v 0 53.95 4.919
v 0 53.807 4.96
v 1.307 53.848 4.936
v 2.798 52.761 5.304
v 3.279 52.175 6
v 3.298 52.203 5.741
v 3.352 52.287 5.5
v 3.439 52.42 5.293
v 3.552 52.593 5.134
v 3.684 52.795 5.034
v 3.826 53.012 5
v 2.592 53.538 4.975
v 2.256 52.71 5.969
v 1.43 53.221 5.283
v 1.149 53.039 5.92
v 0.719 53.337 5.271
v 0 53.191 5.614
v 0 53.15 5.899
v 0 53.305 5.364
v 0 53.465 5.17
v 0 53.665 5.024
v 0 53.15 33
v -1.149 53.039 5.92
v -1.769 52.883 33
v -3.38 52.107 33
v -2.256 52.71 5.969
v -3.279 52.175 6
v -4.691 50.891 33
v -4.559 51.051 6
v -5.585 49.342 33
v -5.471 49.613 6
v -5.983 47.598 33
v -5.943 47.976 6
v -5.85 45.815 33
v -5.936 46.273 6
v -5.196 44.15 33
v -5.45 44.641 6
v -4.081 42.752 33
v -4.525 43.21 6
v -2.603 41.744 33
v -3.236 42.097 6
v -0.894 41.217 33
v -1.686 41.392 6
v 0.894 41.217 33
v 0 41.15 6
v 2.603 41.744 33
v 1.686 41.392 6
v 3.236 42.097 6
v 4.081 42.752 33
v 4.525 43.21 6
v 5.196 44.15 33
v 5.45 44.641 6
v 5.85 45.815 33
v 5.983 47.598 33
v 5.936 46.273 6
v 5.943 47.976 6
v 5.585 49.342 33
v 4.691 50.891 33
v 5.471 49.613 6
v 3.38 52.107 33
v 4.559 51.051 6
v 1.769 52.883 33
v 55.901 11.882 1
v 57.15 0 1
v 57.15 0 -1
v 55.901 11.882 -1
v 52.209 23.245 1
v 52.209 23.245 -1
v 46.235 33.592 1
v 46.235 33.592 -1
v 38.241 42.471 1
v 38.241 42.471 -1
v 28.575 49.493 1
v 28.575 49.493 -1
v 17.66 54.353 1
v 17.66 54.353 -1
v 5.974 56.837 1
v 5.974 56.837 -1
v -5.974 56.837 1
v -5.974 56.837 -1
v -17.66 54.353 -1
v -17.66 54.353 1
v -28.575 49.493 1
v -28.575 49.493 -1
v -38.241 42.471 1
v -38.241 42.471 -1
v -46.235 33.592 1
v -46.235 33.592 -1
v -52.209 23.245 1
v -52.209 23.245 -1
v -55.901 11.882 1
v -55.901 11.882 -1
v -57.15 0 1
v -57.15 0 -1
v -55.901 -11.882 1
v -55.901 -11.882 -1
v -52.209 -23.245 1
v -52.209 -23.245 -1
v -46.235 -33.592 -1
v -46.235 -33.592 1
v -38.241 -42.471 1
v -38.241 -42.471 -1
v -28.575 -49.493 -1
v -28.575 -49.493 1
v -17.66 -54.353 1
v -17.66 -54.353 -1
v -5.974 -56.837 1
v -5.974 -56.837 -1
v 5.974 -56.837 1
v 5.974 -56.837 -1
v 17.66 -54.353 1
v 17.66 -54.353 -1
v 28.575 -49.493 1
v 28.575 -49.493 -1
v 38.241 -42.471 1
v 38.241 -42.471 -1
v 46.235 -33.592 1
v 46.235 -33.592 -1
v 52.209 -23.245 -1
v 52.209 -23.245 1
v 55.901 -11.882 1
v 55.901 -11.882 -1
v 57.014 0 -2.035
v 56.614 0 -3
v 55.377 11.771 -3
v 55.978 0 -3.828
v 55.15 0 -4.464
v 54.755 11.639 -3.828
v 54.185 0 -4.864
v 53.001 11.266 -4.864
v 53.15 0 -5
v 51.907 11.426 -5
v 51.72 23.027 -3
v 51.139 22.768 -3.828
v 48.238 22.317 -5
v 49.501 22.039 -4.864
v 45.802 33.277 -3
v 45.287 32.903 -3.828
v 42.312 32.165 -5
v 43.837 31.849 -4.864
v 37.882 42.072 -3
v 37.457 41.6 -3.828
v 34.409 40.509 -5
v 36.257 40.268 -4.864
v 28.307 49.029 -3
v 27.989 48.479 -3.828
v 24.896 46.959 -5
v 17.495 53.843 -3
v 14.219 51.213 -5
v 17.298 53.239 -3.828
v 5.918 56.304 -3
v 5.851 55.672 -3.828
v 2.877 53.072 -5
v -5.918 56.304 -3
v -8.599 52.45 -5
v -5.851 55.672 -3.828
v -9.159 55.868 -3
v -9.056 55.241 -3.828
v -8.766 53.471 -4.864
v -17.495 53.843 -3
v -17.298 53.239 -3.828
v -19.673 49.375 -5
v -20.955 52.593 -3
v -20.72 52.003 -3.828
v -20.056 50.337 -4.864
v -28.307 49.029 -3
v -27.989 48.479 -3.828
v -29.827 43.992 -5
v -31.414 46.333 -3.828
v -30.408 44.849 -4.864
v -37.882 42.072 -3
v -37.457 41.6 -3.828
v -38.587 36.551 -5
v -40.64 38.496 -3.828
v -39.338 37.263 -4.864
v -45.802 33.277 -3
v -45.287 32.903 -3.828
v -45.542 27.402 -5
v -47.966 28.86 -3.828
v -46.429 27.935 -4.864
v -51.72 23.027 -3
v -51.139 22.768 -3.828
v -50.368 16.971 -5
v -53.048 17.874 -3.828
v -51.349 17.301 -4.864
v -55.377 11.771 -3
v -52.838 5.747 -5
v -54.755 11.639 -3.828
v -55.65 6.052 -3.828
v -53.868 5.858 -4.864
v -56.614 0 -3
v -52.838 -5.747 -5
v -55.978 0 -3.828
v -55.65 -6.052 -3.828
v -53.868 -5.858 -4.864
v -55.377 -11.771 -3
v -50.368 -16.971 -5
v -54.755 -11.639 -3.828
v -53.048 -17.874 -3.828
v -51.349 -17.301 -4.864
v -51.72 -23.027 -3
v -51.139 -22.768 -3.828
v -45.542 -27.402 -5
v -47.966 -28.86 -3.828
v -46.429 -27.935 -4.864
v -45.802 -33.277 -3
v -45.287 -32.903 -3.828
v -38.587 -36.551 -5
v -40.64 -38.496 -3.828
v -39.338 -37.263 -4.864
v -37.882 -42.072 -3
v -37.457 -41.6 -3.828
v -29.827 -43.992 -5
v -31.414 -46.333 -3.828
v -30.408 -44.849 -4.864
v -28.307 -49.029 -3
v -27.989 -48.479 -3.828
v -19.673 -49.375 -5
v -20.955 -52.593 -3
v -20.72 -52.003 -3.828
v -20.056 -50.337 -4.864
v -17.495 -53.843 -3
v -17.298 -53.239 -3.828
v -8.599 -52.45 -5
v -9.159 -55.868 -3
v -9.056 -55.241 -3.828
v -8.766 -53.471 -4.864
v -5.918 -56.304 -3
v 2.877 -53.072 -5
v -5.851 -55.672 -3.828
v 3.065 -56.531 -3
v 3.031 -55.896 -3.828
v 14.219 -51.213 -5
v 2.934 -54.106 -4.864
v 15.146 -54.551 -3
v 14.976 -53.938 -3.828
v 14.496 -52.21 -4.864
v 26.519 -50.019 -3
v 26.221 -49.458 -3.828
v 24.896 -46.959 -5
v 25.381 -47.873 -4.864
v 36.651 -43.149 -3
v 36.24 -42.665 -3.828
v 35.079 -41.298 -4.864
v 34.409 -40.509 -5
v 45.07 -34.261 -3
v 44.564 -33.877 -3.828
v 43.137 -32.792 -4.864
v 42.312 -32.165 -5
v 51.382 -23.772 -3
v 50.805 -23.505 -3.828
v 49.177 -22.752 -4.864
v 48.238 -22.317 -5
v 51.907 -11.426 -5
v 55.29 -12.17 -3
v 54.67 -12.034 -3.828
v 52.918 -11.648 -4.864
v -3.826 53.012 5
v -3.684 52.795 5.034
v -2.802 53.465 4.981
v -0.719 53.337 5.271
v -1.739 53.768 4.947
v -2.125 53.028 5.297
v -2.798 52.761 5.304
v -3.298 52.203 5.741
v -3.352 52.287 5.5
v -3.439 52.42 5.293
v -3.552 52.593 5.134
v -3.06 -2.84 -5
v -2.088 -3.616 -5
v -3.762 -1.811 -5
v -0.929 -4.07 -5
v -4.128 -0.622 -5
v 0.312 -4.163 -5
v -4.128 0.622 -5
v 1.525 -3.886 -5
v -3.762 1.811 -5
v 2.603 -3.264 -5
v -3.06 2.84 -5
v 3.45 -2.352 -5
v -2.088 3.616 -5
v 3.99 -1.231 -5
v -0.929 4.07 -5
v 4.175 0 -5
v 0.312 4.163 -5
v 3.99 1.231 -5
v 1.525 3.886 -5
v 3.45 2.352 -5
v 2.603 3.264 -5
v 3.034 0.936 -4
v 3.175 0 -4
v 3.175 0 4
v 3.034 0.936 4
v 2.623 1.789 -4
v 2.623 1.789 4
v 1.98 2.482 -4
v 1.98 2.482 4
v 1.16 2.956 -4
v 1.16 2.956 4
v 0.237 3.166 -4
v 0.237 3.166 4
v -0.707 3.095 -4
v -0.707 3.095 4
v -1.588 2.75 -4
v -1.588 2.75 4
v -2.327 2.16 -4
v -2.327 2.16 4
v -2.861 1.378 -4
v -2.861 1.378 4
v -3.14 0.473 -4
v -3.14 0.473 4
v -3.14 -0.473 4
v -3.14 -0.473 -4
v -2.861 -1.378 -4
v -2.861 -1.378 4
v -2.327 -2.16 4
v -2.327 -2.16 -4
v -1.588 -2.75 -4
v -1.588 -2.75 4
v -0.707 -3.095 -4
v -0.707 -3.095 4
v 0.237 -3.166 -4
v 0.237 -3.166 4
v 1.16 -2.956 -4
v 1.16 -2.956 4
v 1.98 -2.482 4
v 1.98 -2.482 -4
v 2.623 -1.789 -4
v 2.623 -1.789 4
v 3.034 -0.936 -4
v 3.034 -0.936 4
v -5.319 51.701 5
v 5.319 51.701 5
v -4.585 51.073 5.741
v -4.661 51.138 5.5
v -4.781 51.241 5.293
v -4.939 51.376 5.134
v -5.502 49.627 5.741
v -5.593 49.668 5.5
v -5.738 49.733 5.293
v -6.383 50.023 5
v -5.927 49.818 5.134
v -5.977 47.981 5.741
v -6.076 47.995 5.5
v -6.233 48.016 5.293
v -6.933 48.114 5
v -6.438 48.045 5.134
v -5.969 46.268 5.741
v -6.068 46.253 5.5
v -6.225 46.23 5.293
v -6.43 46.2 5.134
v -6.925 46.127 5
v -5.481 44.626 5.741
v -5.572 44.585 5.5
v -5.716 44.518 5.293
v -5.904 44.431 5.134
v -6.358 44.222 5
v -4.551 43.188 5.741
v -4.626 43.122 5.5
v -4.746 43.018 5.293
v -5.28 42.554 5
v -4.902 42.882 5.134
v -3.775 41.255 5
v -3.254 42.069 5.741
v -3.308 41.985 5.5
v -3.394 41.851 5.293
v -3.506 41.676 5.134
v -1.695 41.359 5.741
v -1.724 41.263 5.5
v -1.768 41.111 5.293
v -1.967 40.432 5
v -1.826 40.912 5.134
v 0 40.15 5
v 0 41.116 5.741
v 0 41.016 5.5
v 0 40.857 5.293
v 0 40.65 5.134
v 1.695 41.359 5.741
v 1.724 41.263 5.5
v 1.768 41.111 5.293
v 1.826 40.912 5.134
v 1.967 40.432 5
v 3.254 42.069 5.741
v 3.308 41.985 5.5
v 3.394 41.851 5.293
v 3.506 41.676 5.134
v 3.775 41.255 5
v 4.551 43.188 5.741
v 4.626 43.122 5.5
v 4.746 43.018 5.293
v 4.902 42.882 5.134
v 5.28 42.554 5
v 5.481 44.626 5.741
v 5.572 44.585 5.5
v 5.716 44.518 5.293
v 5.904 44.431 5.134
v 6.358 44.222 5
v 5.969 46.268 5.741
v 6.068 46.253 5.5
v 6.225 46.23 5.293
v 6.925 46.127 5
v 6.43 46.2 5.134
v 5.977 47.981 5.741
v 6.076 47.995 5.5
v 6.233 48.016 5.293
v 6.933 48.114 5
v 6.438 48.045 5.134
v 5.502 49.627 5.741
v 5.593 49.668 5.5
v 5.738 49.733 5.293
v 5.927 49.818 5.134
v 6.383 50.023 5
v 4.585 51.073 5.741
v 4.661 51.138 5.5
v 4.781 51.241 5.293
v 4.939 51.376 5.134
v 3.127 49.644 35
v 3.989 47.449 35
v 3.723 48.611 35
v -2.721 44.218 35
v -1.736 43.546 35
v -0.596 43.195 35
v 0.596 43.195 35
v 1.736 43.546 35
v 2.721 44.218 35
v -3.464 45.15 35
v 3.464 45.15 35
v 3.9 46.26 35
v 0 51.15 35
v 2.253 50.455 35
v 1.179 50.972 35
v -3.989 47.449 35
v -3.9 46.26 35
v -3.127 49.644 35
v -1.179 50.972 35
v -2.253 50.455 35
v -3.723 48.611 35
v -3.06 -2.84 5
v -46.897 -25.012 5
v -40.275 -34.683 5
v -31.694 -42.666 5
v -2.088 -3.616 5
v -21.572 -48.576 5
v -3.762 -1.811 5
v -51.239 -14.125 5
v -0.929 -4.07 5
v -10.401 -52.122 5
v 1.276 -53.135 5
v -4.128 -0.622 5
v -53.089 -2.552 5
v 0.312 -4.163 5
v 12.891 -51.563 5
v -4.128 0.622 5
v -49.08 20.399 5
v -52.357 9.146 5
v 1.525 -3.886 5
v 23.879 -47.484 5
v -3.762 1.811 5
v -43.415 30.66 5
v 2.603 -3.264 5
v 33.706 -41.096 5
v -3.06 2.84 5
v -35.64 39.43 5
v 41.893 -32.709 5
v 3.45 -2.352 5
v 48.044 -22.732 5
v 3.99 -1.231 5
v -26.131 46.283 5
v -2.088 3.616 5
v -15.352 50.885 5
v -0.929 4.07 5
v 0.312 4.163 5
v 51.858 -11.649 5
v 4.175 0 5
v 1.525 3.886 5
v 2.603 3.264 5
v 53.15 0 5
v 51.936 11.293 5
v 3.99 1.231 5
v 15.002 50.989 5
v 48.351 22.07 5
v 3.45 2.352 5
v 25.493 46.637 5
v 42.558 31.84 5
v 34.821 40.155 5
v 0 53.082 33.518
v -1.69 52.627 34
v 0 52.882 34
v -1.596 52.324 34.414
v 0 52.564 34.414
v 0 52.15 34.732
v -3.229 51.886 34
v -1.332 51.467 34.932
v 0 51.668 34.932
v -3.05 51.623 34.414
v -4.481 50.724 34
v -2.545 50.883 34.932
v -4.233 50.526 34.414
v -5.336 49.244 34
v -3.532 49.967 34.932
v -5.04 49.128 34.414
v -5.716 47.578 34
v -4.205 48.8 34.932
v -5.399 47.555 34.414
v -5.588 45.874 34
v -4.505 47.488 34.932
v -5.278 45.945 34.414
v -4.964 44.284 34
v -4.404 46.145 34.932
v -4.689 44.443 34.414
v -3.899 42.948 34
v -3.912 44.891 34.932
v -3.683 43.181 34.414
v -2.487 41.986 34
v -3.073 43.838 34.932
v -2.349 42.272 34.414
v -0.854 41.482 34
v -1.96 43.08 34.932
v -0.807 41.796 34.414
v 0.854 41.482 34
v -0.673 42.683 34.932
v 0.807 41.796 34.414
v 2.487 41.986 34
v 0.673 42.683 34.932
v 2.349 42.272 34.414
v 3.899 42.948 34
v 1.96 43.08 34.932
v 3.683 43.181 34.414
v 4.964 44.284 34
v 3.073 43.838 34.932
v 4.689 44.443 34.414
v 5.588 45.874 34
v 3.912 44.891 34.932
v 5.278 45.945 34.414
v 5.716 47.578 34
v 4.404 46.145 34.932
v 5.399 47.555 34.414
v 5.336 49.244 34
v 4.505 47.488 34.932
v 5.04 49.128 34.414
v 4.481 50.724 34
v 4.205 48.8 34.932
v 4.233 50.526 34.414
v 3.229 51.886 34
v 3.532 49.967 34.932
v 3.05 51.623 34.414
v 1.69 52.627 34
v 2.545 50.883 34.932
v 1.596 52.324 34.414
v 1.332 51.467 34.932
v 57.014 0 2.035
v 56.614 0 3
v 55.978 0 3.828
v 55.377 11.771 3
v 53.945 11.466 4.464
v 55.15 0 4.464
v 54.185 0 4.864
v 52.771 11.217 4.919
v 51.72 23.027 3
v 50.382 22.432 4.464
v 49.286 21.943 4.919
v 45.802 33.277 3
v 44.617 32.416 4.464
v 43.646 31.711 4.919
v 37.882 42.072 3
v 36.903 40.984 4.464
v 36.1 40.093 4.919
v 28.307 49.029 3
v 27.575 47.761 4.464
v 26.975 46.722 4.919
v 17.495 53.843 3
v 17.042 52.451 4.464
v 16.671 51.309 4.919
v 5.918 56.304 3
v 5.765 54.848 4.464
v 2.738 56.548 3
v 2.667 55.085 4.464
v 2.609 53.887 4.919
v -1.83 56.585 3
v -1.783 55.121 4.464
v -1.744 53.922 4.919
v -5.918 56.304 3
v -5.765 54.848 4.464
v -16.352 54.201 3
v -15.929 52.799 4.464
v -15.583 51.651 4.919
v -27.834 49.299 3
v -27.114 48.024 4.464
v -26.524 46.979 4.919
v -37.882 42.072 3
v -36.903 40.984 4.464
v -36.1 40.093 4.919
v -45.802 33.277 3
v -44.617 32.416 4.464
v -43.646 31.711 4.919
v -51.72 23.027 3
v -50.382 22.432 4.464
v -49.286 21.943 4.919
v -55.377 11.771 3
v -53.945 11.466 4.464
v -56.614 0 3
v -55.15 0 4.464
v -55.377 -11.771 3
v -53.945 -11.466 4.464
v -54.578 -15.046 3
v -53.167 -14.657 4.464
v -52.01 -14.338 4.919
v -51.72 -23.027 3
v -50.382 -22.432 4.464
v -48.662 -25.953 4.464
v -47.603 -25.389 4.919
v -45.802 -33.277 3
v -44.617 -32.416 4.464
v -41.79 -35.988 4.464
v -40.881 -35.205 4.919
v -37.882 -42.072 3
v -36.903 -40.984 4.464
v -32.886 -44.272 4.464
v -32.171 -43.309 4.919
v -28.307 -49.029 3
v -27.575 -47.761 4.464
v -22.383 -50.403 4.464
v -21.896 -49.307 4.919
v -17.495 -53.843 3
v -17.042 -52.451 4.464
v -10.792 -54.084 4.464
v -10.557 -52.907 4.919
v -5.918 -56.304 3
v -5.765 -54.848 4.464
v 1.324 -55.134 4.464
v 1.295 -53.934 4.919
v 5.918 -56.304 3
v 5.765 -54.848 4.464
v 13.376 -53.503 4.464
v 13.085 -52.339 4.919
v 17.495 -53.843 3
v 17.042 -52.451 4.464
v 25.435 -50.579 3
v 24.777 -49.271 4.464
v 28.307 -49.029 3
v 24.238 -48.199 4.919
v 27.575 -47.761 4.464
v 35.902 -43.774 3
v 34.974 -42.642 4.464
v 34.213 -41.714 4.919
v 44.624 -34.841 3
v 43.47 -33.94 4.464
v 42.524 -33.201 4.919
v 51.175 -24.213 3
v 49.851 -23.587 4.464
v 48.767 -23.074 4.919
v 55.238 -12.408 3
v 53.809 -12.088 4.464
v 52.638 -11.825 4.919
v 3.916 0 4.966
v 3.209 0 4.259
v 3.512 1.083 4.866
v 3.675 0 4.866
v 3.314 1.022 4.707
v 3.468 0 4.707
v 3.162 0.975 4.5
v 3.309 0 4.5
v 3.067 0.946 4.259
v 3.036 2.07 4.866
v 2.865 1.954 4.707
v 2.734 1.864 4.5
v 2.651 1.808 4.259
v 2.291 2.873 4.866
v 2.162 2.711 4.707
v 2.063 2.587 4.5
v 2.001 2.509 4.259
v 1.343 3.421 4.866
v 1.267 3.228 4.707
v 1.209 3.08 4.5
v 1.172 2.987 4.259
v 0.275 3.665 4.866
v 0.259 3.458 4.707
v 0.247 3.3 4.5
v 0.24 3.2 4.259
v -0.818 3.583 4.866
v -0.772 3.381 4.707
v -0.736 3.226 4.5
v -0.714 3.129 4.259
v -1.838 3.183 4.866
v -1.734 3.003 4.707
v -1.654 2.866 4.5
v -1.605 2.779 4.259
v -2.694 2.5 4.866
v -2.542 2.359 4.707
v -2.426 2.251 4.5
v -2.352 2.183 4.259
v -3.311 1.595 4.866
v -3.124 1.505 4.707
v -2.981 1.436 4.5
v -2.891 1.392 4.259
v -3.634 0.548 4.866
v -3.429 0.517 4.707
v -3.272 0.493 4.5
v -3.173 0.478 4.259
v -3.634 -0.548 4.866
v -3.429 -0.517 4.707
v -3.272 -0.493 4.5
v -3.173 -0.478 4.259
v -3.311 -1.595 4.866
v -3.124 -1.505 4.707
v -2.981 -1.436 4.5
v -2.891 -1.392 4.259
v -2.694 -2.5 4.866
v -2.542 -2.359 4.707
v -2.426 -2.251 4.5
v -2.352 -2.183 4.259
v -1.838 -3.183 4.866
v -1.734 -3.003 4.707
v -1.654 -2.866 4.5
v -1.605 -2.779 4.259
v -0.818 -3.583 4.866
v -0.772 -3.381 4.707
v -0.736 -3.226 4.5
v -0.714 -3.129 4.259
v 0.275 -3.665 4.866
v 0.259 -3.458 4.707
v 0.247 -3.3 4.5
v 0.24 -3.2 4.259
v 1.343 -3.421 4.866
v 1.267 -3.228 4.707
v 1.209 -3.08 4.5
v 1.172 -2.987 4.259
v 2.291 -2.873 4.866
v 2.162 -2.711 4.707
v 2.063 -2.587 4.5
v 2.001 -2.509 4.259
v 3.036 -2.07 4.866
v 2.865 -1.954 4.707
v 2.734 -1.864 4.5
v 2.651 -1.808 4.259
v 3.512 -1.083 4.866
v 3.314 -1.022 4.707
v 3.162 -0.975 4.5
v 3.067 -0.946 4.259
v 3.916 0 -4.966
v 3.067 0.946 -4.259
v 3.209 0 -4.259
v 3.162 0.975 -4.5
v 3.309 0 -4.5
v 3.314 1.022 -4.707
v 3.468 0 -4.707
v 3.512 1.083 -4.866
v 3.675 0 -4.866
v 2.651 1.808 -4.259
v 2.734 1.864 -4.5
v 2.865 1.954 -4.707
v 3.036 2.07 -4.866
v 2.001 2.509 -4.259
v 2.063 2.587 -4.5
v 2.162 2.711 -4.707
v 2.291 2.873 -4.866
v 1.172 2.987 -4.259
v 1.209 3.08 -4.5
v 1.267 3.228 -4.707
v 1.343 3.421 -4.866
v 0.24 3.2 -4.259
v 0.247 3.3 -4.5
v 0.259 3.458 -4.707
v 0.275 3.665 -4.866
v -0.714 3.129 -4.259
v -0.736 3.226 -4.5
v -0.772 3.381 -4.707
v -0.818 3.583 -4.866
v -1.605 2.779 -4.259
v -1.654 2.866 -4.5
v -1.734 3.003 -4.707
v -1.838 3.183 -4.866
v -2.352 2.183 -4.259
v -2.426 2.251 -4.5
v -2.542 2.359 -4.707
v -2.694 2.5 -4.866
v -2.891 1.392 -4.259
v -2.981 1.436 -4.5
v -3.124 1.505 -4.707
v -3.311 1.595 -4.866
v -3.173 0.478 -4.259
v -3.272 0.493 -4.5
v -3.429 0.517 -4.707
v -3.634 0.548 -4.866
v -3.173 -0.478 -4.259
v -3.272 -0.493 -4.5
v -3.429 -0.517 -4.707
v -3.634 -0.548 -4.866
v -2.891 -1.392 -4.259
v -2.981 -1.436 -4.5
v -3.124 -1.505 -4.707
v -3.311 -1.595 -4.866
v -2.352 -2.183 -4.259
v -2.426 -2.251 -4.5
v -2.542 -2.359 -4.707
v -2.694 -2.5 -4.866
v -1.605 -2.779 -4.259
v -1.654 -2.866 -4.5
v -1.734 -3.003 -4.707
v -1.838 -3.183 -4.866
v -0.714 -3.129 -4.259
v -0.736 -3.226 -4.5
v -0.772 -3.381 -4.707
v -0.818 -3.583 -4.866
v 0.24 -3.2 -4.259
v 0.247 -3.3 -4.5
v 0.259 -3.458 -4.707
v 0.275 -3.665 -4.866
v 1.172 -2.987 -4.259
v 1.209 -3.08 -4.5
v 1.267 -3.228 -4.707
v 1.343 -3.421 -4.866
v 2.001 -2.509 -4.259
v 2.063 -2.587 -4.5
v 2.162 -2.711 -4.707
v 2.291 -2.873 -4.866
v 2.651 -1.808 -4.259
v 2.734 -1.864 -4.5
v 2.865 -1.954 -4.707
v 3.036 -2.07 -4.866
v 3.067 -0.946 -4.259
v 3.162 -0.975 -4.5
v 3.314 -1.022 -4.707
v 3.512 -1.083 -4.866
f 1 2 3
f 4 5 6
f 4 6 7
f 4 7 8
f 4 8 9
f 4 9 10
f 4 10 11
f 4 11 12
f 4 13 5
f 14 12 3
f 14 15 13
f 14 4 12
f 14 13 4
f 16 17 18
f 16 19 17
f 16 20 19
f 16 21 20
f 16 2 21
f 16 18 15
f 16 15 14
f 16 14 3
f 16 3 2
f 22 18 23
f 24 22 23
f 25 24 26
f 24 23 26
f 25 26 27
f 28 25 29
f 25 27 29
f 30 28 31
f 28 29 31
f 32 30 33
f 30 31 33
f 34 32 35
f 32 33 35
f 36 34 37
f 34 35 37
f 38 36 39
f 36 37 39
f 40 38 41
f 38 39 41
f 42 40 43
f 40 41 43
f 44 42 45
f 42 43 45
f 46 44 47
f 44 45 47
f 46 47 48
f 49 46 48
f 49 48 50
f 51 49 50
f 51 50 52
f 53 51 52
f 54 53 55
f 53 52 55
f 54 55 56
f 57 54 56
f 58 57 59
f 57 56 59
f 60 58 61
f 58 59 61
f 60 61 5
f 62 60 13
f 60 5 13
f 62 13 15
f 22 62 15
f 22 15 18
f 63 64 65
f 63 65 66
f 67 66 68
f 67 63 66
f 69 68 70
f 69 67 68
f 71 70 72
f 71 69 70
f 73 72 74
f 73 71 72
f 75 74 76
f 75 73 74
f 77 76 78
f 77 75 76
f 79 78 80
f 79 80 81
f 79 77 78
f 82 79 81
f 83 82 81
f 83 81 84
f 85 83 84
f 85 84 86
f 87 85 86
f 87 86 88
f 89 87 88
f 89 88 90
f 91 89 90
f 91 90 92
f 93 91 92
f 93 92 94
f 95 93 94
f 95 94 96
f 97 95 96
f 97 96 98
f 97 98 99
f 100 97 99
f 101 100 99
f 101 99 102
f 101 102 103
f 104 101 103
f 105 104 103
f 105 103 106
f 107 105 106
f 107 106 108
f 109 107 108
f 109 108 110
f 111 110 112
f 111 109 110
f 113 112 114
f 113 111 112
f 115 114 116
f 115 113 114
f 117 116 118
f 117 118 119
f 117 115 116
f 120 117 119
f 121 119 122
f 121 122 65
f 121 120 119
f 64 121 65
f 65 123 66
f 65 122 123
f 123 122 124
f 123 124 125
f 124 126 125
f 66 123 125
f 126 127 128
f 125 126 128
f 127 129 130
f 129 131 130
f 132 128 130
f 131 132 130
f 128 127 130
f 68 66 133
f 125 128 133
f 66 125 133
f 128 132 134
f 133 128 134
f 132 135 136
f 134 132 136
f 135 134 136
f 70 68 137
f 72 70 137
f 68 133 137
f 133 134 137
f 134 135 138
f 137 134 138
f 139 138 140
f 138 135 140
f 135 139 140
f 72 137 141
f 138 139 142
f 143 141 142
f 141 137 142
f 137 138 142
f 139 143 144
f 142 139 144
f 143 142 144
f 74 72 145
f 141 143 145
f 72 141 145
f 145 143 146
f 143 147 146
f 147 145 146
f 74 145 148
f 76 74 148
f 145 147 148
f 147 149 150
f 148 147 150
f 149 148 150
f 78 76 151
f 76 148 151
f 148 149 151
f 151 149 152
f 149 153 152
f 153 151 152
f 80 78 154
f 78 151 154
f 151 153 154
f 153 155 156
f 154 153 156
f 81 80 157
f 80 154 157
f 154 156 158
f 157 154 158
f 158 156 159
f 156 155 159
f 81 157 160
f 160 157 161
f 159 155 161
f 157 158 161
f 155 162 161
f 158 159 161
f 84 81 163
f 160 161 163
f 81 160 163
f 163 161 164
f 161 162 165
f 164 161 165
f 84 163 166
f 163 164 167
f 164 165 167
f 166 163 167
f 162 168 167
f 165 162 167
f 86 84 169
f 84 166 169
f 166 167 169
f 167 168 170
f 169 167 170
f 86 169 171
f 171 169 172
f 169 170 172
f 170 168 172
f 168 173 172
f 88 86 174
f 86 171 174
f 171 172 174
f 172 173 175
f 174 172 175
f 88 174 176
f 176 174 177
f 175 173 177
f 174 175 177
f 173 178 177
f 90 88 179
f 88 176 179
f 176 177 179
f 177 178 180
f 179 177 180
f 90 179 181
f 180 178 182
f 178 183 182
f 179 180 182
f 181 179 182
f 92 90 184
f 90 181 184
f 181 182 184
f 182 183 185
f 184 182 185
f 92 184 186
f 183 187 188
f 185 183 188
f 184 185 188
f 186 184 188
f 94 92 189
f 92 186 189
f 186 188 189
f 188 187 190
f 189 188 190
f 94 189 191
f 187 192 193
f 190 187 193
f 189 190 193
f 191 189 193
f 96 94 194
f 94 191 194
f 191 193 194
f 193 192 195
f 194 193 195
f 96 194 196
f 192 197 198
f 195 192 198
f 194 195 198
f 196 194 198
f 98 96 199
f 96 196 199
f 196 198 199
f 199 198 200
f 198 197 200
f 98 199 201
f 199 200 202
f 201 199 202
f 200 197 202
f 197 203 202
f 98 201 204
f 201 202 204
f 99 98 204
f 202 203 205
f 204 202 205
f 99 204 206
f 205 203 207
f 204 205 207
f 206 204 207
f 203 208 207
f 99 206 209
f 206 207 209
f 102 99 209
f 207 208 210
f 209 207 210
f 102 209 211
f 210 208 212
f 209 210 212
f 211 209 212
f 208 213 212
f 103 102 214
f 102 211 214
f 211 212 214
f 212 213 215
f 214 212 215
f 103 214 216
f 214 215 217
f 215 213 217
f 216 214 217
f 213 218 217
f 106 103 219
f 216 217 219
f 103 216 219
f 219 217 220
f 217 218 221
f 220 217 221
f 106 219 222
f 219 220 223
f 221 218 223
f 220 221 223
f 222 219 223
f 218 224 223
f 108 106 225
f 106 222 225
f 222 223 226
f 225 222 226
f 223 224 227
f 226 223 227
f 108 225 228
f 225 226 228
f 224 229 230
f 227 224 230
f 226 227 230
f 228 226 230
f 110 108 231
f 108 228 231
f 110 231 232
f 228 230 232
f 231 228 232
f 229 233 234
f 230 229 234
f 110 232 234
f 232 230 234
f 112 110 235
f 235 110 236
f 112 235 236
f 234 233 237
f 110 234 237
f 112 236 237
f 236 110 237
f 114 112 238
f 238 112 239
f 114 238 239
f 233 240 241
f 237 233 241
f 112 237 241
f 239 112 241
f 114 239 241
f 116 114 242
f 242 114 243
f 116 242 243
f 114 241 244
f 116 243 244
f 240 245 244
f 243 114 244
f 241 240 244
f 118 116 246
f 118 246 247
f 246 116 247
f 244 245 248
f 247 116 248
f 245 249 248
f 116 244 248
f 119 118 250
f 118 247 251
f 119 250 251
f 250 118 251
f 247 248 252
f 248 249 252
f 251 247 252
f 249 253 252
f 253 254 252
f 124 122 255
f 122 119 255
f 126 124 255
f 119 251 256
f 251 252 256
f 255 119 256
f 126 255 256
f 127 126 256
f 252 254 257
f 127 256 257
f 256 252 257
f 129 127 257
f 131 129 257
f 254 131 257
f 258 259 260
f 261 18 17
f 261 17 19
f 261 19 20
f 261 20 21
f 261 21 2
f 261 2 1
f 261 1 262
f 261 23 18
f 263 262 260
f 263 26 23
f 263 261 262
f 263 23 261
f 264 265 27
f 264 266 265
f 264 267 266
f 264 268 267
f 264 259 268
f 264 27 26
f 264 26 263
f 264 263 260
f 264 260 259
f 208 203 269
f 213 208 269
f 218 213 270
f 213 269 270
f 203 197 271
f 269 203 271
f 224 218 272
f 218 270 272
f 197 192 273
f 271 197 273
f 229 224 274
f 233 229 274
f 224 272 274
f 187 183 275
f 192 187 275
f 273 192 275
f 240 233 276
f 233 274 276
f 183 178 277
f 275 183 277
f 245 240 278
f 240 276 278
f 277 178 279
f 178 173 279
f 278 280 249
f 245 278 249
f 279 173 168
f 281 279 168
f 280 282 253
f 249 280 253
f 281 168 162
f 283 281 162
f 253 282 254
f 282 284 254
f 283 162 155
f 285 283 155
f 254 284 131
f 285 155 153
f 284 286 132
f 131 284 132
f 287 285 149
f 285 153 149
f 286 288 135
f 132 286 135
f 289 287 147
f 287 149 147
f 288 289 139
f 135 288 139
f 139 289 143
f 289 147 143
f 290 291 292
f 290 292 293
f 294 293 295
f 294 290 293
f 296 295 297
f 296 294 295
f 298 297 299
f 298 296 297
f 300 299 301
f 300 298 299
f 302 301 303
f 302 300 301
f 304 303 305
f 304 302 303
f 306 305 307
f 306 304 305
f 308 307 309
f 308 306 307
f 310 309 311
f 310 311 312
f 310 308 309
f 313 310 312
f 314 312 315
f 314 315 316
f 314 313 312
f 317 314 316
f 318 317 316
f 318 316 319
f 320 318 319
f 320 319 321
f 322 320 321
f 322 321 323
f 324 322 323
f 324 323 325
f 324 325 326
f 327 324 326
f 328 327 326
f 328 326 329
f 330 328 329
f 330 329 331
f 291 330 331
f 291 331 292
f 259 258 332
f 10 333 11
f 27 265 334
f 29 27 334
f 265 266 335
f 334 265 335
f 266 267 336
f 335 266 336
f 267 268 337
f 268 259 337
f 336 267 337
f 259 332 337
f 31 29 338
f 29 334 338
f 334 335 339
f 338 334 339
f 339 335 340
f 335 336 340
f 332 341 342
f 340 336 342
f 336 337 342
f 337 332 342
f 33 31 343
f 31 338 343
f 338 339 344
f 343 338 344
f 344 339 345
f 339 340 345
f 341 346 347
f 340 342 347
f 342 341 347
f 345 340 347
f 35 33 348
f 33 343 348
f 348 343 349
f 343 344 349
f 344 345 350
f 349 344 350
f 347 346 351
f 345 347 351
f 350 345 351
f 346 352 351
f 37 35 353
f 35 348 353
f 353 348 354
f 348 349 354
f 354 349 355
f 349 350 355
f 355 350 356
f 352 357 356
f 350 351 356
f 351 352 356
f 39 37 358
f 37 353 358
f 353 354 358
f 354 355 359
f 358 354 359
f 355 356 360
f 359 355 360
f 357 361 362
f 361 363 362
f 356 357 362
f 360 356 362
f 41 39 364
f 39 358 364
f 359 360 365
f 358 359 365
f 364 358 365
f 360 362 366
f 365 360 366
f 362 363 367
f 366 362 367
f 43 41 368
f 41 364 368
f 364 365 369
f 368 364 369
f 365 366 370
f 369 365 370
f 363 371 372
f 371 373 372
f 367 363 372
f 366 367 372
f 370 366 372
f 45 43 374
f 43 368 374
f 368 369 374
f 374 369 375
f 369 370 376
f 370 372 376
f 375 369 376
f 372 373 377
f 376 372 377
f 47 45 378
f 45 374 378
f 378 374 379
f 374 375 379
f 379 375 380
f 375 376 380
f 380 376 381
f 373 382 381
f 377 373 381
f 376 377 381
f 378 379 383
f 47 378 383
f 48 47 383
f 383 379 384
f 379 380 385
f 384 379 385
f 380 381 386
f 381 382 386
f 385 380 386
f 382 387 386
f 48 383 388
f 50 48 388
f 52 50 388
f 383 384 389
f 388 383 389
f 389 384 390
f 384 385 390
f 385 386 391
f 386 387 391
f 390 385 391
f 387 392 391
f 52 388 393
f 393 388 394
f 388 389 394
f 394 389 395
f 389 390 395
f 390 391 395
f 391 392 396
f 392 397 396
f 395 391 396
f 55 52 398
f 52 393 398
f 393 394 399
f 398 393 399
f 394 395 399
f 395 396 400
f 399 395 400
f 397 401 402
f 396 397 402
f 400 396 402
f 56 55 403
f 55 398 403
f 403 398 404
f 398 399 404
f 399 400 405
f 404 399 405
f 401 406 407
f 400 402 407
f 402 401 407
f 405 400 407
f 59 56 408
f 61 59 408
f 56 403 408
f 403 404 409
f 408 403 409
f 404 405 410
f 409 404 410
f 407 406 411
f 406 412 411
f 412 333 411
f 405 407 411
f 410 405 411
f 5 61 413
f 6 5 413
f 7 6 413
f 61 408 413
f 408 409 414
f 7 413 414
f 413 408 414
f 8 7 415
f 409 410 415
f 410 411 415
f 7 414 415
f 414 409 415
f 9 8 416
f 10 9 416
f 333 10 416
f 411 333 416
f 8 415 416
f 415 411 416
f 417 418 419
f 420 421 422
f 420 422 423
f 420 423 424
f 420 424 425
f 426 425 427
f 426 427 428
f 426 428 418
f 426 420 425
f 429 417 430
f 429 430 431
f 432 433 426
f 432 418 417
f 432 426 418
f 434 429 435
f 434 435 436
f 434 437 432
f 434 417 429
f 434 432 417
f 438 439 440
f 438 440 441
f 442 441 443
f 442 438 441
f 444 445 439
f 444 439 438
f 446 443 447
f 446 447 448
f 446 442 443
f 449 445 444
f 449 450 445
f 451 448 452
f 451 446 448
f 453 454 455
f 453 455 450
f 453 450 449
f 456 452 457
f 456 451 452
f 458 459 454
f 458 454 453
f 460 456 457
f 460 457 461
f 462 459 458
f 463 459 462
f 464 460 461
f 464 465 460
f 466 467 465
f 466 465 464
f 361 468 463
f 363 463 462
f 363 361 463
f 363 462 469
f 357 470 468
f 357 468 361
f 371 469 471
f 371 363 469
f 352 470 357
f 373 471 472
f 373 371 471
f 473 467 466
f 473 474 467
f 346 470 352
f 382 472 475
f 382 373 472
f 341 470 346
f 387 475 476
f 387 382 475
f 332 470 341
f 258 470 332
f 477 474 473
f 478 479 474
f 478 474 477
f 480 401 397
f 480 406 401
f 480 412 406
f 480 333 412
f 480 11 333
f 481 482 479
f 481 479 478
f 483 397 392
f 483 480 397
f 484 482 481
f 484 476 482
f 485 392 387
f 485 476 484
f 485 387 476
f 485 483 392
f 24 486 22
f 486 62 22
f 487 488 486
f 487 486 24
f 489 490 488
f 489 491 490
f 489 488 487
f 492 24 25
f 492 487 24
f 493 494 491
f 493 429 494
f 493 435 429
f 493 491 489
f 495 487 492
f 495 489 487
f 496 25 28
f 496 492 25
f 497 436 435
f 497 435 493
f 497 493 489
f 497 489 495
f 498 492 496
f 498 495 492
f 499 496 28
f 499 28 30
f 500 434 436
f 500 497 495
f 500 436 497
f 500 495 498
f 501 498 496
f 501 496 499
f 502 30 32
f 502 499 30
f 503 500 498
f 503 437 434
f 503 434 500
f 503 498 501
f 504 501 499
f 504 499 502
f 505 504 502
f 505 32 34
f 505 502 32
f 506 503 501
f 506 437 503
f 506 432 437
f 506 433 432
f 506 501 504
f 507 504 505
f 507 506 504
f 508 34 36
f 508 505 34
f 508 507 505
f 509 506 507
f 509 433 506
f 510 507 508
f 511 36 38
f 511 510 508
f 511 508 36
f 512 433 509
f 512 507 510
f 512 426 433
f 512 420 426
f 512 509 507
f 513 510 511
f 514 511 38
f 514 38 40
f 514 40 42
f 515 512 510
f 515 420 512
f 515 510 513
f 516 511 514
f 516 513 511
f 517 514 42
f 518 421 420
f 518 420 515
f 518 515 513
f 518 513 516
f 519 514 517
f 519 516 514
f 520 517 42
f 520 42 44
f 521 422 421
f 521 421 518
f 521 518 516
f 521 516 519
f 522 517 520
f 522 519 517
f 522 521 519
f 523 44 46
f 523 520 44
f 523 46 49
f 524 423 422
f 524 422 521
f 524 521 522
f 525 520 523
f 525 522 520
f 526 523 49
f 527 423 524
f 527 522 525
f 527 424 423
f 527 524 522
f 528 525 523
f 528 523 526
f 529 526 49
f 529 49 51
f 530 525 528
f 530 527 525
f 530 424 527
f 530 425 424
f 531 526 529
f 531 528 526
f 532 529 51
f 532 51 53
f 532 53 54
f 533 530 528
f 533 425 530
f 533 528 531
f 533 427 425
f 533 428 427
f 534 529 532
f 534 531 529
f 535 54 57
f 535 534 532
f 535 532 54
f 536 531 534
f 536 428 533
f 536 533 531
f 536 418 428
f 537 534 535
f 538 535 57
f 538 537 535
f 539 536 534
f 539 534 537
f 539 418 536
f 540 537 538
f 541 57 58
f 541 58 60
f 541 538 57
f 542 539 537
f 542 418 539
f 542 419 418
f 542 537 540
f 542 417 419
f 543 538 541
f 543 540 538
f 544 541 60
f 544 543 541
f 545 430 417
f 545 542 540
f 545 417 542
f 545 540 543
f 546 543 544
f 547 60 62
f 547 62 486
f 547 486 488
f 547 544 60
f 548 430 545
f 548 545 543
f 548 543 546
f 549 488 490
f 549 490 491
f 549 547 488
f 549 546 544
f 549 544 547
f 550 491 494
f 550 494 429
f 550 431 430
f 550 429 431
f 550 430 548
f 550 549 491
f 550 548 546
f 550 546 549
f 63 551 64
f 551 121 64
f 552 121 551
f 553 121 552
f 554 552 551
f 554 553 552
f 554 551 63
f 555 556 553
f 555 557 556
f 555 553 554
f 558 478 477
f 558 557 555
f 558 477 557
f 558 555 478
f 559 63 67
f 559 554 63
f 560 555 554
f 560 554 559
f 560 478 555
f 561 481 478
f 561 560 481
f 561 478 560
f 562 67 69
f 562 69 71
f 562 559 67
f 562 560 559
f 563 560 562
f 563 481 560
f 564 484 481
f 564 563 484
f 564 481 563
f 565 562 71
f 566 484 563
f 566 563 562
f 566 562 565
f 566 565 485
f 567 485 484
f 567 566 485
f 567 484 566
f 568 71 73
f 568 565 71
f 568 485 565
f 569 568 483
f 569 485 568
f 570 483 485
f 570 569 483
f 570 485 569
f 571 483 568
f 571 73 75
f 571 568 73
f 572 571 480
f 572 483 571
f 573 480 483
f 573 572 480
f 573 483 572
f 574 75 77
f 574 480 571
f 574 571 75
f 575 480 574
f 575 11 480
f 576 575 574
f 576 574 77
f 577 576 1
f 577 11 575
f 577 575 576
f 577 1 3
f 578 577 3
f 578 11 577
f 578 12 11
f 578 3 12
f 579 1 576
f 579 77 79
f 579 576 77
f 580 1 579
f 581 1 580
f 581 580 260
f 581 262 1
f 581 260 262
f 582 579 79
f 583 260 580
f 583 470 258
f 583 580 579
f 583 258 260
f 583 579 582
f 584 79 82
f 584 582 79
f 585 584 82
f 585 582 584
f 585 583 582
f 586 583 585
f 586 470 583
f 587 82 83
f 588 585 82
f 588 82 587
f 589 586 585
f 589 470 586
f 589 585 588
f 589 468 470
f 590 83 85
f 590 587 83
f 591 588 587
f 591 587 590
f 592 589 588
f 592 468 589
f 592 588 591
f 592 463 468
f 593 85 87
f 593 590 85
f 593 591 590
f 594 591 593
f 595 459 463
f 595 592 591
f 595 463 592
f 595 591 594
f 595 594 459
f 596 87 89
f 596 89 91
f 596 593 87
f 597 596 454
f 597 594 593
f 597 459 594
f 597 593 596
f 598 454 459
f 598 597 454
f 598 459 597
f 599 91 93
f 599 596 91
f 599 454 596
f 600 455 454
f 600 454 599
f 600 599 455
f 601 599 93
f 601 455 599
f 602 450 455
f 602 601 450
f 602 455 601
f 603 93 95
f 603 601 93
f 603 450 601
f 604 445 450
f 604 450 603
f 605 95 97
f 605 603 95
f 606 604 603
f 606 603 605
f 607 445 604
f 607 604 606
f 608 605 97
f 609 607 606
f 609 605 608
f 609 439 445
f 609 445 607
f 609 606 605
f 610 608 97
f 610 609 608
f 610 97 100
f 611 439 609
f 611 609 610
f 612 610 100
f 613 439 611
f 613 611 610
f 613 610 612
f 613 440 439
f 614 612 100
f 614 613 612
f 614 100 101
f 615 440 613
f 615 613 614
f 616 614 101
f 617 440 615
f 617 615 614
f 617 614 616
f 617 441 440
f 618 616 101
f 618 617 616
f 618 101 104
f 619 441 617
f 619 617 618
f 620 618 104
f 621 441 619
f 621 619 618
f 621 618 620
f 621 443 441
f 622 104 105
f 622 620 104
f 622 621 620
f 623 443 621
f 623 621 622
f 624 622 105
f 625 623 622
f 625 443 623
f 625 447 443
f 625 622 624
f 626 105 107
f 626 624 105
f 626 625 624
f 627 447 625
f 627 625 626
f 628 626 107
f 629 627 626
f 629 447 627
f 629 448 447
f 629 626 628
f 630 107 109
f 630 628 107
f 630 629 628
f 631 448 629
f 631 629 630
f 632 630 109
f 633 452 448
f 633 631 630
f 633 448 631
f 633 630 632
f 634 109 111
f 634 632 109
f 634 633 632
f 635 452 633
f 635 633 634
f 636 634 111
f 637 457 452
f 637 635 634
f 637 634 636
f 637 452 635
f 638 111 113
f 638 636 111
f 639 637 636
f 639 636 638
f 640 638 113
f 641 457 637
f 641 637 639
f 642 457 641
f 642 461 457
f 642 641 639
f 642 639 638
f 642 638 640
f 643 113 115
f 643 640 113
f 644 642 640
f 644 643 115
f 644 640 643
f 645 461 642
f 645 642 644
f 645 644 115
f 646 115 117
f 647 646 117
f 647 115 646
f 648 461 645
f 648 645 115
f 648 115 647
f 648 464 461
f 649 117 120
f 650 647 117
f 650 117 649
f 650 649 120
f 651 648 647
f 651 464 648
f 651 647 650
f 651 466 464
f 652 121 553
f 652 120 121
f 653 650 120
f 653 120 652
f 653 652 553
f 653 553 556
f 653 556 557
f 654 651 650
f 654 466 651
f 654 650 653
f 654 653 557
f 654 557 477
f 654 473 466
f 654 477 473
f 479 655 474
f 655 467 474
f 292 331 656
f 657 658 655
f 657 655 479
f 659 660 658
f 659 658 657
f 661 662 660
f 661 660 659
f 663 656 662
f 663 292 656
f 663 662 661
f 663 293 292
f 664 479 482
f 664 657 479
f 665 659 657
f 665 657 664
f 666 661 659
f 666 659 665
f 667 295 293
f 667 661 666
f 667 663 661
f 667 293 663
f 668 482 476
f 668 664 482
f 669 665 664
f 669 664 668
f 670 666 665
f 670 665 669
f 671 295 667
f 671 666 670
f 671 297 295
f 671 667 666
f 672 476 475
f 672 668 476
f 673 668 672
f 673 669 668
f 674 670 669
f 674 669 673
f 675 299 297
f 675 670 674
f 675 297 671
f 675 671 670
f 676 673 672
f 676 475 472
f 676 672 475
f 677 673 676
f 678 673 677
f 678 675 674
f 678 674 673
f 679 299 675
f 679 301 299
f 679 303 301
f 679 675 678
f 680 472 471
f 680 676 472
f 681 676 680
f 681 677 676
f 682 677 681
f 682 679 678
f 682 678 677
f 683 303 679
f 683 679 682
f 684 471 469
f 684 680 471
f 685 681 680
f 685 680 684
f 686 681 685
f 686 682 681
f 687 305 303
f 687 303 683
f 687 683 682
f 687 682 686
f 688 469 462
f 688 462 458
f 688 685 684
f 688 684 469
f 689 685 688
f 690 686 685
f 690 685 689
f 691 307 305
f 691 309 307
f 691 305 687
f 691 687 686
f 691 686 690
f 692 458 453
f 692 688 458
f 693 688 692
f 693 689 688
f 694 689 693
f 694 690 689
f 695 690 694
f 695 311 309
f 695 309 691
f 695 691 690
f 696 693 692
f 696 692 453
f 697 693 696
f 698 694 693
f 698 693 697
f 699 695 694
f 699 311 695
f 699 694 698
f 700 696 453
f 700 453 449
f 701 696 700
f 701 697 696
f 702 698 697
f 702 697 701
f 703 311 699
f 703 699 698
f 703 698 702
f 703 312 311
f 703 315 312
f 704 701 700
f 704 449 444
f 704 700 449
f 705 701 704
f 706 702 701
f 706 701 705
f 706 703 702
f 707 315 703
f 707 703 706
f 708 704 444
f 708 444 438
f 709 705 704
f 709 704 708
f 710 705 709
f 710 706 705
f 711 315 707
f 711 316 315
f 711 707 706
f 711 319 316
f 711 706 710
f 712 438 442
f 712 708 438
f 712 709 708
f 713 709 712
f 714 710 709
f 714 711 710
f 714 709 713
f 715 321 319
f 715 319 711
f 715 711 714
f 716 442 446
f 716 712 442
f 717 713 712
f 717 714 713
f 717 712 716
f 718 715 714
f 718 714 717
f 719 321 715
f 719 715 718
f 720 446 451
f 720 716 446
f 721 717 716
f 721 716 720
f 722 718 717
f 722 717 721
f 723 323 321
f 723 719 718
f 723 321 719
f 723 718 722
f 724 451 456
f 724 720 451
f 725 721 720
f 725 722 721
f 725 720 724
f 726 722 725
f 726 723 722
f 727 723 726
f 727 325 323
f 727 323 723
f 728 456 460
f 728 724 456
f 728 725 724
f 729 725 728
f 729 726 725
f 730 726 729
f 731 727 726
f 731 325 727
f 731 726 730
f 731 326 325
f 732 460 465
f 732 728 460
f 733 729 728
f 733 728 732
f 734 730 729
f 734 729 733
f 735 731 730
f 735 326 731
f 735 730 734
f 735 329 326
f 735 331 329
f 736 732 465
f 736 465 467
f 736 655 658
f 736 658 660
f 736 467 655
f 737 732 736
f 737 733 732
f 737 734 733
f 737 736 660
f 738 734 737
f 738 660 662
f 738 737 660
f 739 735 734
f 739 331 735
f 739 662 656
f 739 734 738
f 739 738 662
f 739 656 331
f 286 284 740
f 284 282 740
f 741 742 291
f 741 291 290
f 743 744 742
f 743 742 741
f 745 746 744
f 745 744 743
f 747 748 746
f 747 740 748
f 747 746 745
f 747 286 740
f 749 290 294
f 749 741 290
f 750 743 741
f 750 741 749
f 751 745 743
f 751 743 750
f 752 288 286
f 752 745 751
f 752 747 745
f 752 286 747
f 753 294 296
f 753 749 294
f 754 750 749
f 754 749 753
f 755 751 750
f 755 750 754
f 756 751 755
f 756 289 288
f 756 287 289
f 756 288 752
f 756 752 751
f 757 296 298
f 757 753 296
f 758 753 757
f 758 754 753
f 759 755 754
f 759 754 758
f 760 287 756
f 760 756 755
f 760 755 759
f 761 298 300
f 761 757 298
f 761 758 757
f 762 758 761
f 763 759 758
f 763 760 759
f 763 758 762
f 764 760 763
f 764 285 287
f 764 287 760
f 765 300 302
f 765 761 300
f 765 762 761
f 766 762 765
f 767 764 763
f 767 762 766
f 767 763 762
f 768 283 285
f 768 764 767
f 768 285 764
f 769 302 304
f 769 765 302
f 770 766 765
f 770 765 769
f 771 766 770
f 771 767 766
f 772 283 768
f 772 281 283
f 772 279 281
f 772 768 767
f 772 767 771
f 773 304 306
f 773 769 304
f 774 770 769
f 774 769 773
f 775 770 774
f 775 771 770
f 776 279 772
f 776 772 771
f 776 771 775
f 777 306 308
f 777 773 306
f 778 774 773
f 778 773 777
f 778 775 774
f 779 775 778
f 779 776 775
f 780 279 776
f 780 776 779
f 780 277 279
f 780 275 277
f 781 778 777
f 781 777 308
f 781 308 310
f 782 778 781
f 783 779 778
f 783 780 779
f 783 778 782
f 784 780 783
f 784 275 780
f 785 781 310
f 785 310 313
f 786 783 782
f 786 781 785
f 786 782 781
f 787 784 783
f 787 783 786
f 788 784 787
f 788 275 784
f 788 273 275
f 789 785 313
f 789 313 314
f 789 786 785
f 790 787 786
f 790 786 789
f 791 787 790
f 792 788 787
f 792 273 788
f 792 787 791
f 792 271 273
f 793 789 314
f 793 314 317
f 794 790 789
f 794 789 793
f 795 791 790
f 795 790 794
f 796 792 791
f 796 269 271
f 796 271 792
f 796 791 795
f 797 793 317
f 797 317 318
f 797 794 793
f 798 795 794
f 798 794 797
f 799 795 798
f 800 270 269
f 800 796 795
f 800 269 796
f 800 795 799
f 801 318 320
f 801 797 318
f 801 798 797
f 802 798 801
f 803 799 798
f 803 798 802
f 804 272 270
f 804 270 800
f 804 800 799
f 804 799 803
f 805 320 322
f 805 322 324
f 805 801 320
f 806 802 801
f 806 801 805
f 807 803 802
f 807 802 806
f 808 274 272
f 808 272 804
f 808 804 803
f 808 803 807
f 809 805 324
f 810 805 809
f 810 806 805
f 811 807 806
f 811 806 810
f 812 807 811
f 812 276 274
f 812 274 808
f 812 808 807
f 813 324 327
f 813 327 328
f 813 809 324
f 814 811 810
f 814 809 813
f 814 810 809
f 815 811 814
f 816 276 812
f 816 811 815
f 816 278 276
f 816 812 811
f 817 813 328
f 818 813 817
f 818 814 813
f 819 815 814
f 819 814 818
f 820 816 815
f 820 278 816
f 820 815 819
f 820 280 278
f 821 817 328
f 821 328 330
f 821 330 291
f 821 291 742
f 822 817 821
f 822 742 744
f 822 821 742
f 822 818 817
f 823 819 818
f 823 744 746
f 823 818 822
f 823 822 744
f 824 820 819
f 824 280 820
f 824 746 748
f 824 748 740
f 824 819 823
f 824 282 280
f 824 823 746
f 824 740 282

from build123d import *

# Parameters (mm, degrees)
SKETCH1_R           = 57.15
SKETCH1_R_2         = 3.175
BOSS_EXTRUDE1_DEPTH = 5
FILLET1_R           = 4
SKETCH2_R           = 6
BOSS_EXTRUDE2_DEPTH = 30
FILLET2_R           = 2
FILLET3_R           = 1


with BuildPart() as part:
    # Sketch1 → Boss-Extrude1 (new, symmetric)
    with BuildSketch(Plane.XY):
        Circle(SKETCH1_R)
        Circle(SKETCH1_R_2, mode=Mode.SUBTRACT)
    extrude(amount=BOSS_EXTRUDE1_DEPTH, both=True)

    # Fillet1
    fillet1_edges = [part.edges().sort_by_distance(p)[0] for p in [
        (-57.15, 0, -5),
        (-57.15, 0, 5),
    ]]
    fillet(fillet1_edges, radius=FILLET1_R)

    # Sketch2 → Boss-Extrude2 (add)
    with BuildSketch(Plane.XY.offset(5)):
        with Locations(Location((0, 47.15, 0), (0, 0, 90))):
            Circle(SKETCH2_R)
    extrude(amount=BOSS_EXTRUDE2_DEPTH)

    # Fillet2
    fillet2_edges = [part.edges().sort_by_distance(p)[0] for p in [
        (0, 41.15, 35),
    ]]
    fillet(fillet2_edges, radius=FILLET2_R)

    # Fillet3
    fillet3_edges = [part.edges().sort_by_distance(p)[0] for p in [
        (0, 41.15, 5),
        (-3.175, 0, -5),
        (-3.175, 0, 5),
    ]]
    fillet(fillet3_edges, radius=FILLET3_R)


solid = part.part
